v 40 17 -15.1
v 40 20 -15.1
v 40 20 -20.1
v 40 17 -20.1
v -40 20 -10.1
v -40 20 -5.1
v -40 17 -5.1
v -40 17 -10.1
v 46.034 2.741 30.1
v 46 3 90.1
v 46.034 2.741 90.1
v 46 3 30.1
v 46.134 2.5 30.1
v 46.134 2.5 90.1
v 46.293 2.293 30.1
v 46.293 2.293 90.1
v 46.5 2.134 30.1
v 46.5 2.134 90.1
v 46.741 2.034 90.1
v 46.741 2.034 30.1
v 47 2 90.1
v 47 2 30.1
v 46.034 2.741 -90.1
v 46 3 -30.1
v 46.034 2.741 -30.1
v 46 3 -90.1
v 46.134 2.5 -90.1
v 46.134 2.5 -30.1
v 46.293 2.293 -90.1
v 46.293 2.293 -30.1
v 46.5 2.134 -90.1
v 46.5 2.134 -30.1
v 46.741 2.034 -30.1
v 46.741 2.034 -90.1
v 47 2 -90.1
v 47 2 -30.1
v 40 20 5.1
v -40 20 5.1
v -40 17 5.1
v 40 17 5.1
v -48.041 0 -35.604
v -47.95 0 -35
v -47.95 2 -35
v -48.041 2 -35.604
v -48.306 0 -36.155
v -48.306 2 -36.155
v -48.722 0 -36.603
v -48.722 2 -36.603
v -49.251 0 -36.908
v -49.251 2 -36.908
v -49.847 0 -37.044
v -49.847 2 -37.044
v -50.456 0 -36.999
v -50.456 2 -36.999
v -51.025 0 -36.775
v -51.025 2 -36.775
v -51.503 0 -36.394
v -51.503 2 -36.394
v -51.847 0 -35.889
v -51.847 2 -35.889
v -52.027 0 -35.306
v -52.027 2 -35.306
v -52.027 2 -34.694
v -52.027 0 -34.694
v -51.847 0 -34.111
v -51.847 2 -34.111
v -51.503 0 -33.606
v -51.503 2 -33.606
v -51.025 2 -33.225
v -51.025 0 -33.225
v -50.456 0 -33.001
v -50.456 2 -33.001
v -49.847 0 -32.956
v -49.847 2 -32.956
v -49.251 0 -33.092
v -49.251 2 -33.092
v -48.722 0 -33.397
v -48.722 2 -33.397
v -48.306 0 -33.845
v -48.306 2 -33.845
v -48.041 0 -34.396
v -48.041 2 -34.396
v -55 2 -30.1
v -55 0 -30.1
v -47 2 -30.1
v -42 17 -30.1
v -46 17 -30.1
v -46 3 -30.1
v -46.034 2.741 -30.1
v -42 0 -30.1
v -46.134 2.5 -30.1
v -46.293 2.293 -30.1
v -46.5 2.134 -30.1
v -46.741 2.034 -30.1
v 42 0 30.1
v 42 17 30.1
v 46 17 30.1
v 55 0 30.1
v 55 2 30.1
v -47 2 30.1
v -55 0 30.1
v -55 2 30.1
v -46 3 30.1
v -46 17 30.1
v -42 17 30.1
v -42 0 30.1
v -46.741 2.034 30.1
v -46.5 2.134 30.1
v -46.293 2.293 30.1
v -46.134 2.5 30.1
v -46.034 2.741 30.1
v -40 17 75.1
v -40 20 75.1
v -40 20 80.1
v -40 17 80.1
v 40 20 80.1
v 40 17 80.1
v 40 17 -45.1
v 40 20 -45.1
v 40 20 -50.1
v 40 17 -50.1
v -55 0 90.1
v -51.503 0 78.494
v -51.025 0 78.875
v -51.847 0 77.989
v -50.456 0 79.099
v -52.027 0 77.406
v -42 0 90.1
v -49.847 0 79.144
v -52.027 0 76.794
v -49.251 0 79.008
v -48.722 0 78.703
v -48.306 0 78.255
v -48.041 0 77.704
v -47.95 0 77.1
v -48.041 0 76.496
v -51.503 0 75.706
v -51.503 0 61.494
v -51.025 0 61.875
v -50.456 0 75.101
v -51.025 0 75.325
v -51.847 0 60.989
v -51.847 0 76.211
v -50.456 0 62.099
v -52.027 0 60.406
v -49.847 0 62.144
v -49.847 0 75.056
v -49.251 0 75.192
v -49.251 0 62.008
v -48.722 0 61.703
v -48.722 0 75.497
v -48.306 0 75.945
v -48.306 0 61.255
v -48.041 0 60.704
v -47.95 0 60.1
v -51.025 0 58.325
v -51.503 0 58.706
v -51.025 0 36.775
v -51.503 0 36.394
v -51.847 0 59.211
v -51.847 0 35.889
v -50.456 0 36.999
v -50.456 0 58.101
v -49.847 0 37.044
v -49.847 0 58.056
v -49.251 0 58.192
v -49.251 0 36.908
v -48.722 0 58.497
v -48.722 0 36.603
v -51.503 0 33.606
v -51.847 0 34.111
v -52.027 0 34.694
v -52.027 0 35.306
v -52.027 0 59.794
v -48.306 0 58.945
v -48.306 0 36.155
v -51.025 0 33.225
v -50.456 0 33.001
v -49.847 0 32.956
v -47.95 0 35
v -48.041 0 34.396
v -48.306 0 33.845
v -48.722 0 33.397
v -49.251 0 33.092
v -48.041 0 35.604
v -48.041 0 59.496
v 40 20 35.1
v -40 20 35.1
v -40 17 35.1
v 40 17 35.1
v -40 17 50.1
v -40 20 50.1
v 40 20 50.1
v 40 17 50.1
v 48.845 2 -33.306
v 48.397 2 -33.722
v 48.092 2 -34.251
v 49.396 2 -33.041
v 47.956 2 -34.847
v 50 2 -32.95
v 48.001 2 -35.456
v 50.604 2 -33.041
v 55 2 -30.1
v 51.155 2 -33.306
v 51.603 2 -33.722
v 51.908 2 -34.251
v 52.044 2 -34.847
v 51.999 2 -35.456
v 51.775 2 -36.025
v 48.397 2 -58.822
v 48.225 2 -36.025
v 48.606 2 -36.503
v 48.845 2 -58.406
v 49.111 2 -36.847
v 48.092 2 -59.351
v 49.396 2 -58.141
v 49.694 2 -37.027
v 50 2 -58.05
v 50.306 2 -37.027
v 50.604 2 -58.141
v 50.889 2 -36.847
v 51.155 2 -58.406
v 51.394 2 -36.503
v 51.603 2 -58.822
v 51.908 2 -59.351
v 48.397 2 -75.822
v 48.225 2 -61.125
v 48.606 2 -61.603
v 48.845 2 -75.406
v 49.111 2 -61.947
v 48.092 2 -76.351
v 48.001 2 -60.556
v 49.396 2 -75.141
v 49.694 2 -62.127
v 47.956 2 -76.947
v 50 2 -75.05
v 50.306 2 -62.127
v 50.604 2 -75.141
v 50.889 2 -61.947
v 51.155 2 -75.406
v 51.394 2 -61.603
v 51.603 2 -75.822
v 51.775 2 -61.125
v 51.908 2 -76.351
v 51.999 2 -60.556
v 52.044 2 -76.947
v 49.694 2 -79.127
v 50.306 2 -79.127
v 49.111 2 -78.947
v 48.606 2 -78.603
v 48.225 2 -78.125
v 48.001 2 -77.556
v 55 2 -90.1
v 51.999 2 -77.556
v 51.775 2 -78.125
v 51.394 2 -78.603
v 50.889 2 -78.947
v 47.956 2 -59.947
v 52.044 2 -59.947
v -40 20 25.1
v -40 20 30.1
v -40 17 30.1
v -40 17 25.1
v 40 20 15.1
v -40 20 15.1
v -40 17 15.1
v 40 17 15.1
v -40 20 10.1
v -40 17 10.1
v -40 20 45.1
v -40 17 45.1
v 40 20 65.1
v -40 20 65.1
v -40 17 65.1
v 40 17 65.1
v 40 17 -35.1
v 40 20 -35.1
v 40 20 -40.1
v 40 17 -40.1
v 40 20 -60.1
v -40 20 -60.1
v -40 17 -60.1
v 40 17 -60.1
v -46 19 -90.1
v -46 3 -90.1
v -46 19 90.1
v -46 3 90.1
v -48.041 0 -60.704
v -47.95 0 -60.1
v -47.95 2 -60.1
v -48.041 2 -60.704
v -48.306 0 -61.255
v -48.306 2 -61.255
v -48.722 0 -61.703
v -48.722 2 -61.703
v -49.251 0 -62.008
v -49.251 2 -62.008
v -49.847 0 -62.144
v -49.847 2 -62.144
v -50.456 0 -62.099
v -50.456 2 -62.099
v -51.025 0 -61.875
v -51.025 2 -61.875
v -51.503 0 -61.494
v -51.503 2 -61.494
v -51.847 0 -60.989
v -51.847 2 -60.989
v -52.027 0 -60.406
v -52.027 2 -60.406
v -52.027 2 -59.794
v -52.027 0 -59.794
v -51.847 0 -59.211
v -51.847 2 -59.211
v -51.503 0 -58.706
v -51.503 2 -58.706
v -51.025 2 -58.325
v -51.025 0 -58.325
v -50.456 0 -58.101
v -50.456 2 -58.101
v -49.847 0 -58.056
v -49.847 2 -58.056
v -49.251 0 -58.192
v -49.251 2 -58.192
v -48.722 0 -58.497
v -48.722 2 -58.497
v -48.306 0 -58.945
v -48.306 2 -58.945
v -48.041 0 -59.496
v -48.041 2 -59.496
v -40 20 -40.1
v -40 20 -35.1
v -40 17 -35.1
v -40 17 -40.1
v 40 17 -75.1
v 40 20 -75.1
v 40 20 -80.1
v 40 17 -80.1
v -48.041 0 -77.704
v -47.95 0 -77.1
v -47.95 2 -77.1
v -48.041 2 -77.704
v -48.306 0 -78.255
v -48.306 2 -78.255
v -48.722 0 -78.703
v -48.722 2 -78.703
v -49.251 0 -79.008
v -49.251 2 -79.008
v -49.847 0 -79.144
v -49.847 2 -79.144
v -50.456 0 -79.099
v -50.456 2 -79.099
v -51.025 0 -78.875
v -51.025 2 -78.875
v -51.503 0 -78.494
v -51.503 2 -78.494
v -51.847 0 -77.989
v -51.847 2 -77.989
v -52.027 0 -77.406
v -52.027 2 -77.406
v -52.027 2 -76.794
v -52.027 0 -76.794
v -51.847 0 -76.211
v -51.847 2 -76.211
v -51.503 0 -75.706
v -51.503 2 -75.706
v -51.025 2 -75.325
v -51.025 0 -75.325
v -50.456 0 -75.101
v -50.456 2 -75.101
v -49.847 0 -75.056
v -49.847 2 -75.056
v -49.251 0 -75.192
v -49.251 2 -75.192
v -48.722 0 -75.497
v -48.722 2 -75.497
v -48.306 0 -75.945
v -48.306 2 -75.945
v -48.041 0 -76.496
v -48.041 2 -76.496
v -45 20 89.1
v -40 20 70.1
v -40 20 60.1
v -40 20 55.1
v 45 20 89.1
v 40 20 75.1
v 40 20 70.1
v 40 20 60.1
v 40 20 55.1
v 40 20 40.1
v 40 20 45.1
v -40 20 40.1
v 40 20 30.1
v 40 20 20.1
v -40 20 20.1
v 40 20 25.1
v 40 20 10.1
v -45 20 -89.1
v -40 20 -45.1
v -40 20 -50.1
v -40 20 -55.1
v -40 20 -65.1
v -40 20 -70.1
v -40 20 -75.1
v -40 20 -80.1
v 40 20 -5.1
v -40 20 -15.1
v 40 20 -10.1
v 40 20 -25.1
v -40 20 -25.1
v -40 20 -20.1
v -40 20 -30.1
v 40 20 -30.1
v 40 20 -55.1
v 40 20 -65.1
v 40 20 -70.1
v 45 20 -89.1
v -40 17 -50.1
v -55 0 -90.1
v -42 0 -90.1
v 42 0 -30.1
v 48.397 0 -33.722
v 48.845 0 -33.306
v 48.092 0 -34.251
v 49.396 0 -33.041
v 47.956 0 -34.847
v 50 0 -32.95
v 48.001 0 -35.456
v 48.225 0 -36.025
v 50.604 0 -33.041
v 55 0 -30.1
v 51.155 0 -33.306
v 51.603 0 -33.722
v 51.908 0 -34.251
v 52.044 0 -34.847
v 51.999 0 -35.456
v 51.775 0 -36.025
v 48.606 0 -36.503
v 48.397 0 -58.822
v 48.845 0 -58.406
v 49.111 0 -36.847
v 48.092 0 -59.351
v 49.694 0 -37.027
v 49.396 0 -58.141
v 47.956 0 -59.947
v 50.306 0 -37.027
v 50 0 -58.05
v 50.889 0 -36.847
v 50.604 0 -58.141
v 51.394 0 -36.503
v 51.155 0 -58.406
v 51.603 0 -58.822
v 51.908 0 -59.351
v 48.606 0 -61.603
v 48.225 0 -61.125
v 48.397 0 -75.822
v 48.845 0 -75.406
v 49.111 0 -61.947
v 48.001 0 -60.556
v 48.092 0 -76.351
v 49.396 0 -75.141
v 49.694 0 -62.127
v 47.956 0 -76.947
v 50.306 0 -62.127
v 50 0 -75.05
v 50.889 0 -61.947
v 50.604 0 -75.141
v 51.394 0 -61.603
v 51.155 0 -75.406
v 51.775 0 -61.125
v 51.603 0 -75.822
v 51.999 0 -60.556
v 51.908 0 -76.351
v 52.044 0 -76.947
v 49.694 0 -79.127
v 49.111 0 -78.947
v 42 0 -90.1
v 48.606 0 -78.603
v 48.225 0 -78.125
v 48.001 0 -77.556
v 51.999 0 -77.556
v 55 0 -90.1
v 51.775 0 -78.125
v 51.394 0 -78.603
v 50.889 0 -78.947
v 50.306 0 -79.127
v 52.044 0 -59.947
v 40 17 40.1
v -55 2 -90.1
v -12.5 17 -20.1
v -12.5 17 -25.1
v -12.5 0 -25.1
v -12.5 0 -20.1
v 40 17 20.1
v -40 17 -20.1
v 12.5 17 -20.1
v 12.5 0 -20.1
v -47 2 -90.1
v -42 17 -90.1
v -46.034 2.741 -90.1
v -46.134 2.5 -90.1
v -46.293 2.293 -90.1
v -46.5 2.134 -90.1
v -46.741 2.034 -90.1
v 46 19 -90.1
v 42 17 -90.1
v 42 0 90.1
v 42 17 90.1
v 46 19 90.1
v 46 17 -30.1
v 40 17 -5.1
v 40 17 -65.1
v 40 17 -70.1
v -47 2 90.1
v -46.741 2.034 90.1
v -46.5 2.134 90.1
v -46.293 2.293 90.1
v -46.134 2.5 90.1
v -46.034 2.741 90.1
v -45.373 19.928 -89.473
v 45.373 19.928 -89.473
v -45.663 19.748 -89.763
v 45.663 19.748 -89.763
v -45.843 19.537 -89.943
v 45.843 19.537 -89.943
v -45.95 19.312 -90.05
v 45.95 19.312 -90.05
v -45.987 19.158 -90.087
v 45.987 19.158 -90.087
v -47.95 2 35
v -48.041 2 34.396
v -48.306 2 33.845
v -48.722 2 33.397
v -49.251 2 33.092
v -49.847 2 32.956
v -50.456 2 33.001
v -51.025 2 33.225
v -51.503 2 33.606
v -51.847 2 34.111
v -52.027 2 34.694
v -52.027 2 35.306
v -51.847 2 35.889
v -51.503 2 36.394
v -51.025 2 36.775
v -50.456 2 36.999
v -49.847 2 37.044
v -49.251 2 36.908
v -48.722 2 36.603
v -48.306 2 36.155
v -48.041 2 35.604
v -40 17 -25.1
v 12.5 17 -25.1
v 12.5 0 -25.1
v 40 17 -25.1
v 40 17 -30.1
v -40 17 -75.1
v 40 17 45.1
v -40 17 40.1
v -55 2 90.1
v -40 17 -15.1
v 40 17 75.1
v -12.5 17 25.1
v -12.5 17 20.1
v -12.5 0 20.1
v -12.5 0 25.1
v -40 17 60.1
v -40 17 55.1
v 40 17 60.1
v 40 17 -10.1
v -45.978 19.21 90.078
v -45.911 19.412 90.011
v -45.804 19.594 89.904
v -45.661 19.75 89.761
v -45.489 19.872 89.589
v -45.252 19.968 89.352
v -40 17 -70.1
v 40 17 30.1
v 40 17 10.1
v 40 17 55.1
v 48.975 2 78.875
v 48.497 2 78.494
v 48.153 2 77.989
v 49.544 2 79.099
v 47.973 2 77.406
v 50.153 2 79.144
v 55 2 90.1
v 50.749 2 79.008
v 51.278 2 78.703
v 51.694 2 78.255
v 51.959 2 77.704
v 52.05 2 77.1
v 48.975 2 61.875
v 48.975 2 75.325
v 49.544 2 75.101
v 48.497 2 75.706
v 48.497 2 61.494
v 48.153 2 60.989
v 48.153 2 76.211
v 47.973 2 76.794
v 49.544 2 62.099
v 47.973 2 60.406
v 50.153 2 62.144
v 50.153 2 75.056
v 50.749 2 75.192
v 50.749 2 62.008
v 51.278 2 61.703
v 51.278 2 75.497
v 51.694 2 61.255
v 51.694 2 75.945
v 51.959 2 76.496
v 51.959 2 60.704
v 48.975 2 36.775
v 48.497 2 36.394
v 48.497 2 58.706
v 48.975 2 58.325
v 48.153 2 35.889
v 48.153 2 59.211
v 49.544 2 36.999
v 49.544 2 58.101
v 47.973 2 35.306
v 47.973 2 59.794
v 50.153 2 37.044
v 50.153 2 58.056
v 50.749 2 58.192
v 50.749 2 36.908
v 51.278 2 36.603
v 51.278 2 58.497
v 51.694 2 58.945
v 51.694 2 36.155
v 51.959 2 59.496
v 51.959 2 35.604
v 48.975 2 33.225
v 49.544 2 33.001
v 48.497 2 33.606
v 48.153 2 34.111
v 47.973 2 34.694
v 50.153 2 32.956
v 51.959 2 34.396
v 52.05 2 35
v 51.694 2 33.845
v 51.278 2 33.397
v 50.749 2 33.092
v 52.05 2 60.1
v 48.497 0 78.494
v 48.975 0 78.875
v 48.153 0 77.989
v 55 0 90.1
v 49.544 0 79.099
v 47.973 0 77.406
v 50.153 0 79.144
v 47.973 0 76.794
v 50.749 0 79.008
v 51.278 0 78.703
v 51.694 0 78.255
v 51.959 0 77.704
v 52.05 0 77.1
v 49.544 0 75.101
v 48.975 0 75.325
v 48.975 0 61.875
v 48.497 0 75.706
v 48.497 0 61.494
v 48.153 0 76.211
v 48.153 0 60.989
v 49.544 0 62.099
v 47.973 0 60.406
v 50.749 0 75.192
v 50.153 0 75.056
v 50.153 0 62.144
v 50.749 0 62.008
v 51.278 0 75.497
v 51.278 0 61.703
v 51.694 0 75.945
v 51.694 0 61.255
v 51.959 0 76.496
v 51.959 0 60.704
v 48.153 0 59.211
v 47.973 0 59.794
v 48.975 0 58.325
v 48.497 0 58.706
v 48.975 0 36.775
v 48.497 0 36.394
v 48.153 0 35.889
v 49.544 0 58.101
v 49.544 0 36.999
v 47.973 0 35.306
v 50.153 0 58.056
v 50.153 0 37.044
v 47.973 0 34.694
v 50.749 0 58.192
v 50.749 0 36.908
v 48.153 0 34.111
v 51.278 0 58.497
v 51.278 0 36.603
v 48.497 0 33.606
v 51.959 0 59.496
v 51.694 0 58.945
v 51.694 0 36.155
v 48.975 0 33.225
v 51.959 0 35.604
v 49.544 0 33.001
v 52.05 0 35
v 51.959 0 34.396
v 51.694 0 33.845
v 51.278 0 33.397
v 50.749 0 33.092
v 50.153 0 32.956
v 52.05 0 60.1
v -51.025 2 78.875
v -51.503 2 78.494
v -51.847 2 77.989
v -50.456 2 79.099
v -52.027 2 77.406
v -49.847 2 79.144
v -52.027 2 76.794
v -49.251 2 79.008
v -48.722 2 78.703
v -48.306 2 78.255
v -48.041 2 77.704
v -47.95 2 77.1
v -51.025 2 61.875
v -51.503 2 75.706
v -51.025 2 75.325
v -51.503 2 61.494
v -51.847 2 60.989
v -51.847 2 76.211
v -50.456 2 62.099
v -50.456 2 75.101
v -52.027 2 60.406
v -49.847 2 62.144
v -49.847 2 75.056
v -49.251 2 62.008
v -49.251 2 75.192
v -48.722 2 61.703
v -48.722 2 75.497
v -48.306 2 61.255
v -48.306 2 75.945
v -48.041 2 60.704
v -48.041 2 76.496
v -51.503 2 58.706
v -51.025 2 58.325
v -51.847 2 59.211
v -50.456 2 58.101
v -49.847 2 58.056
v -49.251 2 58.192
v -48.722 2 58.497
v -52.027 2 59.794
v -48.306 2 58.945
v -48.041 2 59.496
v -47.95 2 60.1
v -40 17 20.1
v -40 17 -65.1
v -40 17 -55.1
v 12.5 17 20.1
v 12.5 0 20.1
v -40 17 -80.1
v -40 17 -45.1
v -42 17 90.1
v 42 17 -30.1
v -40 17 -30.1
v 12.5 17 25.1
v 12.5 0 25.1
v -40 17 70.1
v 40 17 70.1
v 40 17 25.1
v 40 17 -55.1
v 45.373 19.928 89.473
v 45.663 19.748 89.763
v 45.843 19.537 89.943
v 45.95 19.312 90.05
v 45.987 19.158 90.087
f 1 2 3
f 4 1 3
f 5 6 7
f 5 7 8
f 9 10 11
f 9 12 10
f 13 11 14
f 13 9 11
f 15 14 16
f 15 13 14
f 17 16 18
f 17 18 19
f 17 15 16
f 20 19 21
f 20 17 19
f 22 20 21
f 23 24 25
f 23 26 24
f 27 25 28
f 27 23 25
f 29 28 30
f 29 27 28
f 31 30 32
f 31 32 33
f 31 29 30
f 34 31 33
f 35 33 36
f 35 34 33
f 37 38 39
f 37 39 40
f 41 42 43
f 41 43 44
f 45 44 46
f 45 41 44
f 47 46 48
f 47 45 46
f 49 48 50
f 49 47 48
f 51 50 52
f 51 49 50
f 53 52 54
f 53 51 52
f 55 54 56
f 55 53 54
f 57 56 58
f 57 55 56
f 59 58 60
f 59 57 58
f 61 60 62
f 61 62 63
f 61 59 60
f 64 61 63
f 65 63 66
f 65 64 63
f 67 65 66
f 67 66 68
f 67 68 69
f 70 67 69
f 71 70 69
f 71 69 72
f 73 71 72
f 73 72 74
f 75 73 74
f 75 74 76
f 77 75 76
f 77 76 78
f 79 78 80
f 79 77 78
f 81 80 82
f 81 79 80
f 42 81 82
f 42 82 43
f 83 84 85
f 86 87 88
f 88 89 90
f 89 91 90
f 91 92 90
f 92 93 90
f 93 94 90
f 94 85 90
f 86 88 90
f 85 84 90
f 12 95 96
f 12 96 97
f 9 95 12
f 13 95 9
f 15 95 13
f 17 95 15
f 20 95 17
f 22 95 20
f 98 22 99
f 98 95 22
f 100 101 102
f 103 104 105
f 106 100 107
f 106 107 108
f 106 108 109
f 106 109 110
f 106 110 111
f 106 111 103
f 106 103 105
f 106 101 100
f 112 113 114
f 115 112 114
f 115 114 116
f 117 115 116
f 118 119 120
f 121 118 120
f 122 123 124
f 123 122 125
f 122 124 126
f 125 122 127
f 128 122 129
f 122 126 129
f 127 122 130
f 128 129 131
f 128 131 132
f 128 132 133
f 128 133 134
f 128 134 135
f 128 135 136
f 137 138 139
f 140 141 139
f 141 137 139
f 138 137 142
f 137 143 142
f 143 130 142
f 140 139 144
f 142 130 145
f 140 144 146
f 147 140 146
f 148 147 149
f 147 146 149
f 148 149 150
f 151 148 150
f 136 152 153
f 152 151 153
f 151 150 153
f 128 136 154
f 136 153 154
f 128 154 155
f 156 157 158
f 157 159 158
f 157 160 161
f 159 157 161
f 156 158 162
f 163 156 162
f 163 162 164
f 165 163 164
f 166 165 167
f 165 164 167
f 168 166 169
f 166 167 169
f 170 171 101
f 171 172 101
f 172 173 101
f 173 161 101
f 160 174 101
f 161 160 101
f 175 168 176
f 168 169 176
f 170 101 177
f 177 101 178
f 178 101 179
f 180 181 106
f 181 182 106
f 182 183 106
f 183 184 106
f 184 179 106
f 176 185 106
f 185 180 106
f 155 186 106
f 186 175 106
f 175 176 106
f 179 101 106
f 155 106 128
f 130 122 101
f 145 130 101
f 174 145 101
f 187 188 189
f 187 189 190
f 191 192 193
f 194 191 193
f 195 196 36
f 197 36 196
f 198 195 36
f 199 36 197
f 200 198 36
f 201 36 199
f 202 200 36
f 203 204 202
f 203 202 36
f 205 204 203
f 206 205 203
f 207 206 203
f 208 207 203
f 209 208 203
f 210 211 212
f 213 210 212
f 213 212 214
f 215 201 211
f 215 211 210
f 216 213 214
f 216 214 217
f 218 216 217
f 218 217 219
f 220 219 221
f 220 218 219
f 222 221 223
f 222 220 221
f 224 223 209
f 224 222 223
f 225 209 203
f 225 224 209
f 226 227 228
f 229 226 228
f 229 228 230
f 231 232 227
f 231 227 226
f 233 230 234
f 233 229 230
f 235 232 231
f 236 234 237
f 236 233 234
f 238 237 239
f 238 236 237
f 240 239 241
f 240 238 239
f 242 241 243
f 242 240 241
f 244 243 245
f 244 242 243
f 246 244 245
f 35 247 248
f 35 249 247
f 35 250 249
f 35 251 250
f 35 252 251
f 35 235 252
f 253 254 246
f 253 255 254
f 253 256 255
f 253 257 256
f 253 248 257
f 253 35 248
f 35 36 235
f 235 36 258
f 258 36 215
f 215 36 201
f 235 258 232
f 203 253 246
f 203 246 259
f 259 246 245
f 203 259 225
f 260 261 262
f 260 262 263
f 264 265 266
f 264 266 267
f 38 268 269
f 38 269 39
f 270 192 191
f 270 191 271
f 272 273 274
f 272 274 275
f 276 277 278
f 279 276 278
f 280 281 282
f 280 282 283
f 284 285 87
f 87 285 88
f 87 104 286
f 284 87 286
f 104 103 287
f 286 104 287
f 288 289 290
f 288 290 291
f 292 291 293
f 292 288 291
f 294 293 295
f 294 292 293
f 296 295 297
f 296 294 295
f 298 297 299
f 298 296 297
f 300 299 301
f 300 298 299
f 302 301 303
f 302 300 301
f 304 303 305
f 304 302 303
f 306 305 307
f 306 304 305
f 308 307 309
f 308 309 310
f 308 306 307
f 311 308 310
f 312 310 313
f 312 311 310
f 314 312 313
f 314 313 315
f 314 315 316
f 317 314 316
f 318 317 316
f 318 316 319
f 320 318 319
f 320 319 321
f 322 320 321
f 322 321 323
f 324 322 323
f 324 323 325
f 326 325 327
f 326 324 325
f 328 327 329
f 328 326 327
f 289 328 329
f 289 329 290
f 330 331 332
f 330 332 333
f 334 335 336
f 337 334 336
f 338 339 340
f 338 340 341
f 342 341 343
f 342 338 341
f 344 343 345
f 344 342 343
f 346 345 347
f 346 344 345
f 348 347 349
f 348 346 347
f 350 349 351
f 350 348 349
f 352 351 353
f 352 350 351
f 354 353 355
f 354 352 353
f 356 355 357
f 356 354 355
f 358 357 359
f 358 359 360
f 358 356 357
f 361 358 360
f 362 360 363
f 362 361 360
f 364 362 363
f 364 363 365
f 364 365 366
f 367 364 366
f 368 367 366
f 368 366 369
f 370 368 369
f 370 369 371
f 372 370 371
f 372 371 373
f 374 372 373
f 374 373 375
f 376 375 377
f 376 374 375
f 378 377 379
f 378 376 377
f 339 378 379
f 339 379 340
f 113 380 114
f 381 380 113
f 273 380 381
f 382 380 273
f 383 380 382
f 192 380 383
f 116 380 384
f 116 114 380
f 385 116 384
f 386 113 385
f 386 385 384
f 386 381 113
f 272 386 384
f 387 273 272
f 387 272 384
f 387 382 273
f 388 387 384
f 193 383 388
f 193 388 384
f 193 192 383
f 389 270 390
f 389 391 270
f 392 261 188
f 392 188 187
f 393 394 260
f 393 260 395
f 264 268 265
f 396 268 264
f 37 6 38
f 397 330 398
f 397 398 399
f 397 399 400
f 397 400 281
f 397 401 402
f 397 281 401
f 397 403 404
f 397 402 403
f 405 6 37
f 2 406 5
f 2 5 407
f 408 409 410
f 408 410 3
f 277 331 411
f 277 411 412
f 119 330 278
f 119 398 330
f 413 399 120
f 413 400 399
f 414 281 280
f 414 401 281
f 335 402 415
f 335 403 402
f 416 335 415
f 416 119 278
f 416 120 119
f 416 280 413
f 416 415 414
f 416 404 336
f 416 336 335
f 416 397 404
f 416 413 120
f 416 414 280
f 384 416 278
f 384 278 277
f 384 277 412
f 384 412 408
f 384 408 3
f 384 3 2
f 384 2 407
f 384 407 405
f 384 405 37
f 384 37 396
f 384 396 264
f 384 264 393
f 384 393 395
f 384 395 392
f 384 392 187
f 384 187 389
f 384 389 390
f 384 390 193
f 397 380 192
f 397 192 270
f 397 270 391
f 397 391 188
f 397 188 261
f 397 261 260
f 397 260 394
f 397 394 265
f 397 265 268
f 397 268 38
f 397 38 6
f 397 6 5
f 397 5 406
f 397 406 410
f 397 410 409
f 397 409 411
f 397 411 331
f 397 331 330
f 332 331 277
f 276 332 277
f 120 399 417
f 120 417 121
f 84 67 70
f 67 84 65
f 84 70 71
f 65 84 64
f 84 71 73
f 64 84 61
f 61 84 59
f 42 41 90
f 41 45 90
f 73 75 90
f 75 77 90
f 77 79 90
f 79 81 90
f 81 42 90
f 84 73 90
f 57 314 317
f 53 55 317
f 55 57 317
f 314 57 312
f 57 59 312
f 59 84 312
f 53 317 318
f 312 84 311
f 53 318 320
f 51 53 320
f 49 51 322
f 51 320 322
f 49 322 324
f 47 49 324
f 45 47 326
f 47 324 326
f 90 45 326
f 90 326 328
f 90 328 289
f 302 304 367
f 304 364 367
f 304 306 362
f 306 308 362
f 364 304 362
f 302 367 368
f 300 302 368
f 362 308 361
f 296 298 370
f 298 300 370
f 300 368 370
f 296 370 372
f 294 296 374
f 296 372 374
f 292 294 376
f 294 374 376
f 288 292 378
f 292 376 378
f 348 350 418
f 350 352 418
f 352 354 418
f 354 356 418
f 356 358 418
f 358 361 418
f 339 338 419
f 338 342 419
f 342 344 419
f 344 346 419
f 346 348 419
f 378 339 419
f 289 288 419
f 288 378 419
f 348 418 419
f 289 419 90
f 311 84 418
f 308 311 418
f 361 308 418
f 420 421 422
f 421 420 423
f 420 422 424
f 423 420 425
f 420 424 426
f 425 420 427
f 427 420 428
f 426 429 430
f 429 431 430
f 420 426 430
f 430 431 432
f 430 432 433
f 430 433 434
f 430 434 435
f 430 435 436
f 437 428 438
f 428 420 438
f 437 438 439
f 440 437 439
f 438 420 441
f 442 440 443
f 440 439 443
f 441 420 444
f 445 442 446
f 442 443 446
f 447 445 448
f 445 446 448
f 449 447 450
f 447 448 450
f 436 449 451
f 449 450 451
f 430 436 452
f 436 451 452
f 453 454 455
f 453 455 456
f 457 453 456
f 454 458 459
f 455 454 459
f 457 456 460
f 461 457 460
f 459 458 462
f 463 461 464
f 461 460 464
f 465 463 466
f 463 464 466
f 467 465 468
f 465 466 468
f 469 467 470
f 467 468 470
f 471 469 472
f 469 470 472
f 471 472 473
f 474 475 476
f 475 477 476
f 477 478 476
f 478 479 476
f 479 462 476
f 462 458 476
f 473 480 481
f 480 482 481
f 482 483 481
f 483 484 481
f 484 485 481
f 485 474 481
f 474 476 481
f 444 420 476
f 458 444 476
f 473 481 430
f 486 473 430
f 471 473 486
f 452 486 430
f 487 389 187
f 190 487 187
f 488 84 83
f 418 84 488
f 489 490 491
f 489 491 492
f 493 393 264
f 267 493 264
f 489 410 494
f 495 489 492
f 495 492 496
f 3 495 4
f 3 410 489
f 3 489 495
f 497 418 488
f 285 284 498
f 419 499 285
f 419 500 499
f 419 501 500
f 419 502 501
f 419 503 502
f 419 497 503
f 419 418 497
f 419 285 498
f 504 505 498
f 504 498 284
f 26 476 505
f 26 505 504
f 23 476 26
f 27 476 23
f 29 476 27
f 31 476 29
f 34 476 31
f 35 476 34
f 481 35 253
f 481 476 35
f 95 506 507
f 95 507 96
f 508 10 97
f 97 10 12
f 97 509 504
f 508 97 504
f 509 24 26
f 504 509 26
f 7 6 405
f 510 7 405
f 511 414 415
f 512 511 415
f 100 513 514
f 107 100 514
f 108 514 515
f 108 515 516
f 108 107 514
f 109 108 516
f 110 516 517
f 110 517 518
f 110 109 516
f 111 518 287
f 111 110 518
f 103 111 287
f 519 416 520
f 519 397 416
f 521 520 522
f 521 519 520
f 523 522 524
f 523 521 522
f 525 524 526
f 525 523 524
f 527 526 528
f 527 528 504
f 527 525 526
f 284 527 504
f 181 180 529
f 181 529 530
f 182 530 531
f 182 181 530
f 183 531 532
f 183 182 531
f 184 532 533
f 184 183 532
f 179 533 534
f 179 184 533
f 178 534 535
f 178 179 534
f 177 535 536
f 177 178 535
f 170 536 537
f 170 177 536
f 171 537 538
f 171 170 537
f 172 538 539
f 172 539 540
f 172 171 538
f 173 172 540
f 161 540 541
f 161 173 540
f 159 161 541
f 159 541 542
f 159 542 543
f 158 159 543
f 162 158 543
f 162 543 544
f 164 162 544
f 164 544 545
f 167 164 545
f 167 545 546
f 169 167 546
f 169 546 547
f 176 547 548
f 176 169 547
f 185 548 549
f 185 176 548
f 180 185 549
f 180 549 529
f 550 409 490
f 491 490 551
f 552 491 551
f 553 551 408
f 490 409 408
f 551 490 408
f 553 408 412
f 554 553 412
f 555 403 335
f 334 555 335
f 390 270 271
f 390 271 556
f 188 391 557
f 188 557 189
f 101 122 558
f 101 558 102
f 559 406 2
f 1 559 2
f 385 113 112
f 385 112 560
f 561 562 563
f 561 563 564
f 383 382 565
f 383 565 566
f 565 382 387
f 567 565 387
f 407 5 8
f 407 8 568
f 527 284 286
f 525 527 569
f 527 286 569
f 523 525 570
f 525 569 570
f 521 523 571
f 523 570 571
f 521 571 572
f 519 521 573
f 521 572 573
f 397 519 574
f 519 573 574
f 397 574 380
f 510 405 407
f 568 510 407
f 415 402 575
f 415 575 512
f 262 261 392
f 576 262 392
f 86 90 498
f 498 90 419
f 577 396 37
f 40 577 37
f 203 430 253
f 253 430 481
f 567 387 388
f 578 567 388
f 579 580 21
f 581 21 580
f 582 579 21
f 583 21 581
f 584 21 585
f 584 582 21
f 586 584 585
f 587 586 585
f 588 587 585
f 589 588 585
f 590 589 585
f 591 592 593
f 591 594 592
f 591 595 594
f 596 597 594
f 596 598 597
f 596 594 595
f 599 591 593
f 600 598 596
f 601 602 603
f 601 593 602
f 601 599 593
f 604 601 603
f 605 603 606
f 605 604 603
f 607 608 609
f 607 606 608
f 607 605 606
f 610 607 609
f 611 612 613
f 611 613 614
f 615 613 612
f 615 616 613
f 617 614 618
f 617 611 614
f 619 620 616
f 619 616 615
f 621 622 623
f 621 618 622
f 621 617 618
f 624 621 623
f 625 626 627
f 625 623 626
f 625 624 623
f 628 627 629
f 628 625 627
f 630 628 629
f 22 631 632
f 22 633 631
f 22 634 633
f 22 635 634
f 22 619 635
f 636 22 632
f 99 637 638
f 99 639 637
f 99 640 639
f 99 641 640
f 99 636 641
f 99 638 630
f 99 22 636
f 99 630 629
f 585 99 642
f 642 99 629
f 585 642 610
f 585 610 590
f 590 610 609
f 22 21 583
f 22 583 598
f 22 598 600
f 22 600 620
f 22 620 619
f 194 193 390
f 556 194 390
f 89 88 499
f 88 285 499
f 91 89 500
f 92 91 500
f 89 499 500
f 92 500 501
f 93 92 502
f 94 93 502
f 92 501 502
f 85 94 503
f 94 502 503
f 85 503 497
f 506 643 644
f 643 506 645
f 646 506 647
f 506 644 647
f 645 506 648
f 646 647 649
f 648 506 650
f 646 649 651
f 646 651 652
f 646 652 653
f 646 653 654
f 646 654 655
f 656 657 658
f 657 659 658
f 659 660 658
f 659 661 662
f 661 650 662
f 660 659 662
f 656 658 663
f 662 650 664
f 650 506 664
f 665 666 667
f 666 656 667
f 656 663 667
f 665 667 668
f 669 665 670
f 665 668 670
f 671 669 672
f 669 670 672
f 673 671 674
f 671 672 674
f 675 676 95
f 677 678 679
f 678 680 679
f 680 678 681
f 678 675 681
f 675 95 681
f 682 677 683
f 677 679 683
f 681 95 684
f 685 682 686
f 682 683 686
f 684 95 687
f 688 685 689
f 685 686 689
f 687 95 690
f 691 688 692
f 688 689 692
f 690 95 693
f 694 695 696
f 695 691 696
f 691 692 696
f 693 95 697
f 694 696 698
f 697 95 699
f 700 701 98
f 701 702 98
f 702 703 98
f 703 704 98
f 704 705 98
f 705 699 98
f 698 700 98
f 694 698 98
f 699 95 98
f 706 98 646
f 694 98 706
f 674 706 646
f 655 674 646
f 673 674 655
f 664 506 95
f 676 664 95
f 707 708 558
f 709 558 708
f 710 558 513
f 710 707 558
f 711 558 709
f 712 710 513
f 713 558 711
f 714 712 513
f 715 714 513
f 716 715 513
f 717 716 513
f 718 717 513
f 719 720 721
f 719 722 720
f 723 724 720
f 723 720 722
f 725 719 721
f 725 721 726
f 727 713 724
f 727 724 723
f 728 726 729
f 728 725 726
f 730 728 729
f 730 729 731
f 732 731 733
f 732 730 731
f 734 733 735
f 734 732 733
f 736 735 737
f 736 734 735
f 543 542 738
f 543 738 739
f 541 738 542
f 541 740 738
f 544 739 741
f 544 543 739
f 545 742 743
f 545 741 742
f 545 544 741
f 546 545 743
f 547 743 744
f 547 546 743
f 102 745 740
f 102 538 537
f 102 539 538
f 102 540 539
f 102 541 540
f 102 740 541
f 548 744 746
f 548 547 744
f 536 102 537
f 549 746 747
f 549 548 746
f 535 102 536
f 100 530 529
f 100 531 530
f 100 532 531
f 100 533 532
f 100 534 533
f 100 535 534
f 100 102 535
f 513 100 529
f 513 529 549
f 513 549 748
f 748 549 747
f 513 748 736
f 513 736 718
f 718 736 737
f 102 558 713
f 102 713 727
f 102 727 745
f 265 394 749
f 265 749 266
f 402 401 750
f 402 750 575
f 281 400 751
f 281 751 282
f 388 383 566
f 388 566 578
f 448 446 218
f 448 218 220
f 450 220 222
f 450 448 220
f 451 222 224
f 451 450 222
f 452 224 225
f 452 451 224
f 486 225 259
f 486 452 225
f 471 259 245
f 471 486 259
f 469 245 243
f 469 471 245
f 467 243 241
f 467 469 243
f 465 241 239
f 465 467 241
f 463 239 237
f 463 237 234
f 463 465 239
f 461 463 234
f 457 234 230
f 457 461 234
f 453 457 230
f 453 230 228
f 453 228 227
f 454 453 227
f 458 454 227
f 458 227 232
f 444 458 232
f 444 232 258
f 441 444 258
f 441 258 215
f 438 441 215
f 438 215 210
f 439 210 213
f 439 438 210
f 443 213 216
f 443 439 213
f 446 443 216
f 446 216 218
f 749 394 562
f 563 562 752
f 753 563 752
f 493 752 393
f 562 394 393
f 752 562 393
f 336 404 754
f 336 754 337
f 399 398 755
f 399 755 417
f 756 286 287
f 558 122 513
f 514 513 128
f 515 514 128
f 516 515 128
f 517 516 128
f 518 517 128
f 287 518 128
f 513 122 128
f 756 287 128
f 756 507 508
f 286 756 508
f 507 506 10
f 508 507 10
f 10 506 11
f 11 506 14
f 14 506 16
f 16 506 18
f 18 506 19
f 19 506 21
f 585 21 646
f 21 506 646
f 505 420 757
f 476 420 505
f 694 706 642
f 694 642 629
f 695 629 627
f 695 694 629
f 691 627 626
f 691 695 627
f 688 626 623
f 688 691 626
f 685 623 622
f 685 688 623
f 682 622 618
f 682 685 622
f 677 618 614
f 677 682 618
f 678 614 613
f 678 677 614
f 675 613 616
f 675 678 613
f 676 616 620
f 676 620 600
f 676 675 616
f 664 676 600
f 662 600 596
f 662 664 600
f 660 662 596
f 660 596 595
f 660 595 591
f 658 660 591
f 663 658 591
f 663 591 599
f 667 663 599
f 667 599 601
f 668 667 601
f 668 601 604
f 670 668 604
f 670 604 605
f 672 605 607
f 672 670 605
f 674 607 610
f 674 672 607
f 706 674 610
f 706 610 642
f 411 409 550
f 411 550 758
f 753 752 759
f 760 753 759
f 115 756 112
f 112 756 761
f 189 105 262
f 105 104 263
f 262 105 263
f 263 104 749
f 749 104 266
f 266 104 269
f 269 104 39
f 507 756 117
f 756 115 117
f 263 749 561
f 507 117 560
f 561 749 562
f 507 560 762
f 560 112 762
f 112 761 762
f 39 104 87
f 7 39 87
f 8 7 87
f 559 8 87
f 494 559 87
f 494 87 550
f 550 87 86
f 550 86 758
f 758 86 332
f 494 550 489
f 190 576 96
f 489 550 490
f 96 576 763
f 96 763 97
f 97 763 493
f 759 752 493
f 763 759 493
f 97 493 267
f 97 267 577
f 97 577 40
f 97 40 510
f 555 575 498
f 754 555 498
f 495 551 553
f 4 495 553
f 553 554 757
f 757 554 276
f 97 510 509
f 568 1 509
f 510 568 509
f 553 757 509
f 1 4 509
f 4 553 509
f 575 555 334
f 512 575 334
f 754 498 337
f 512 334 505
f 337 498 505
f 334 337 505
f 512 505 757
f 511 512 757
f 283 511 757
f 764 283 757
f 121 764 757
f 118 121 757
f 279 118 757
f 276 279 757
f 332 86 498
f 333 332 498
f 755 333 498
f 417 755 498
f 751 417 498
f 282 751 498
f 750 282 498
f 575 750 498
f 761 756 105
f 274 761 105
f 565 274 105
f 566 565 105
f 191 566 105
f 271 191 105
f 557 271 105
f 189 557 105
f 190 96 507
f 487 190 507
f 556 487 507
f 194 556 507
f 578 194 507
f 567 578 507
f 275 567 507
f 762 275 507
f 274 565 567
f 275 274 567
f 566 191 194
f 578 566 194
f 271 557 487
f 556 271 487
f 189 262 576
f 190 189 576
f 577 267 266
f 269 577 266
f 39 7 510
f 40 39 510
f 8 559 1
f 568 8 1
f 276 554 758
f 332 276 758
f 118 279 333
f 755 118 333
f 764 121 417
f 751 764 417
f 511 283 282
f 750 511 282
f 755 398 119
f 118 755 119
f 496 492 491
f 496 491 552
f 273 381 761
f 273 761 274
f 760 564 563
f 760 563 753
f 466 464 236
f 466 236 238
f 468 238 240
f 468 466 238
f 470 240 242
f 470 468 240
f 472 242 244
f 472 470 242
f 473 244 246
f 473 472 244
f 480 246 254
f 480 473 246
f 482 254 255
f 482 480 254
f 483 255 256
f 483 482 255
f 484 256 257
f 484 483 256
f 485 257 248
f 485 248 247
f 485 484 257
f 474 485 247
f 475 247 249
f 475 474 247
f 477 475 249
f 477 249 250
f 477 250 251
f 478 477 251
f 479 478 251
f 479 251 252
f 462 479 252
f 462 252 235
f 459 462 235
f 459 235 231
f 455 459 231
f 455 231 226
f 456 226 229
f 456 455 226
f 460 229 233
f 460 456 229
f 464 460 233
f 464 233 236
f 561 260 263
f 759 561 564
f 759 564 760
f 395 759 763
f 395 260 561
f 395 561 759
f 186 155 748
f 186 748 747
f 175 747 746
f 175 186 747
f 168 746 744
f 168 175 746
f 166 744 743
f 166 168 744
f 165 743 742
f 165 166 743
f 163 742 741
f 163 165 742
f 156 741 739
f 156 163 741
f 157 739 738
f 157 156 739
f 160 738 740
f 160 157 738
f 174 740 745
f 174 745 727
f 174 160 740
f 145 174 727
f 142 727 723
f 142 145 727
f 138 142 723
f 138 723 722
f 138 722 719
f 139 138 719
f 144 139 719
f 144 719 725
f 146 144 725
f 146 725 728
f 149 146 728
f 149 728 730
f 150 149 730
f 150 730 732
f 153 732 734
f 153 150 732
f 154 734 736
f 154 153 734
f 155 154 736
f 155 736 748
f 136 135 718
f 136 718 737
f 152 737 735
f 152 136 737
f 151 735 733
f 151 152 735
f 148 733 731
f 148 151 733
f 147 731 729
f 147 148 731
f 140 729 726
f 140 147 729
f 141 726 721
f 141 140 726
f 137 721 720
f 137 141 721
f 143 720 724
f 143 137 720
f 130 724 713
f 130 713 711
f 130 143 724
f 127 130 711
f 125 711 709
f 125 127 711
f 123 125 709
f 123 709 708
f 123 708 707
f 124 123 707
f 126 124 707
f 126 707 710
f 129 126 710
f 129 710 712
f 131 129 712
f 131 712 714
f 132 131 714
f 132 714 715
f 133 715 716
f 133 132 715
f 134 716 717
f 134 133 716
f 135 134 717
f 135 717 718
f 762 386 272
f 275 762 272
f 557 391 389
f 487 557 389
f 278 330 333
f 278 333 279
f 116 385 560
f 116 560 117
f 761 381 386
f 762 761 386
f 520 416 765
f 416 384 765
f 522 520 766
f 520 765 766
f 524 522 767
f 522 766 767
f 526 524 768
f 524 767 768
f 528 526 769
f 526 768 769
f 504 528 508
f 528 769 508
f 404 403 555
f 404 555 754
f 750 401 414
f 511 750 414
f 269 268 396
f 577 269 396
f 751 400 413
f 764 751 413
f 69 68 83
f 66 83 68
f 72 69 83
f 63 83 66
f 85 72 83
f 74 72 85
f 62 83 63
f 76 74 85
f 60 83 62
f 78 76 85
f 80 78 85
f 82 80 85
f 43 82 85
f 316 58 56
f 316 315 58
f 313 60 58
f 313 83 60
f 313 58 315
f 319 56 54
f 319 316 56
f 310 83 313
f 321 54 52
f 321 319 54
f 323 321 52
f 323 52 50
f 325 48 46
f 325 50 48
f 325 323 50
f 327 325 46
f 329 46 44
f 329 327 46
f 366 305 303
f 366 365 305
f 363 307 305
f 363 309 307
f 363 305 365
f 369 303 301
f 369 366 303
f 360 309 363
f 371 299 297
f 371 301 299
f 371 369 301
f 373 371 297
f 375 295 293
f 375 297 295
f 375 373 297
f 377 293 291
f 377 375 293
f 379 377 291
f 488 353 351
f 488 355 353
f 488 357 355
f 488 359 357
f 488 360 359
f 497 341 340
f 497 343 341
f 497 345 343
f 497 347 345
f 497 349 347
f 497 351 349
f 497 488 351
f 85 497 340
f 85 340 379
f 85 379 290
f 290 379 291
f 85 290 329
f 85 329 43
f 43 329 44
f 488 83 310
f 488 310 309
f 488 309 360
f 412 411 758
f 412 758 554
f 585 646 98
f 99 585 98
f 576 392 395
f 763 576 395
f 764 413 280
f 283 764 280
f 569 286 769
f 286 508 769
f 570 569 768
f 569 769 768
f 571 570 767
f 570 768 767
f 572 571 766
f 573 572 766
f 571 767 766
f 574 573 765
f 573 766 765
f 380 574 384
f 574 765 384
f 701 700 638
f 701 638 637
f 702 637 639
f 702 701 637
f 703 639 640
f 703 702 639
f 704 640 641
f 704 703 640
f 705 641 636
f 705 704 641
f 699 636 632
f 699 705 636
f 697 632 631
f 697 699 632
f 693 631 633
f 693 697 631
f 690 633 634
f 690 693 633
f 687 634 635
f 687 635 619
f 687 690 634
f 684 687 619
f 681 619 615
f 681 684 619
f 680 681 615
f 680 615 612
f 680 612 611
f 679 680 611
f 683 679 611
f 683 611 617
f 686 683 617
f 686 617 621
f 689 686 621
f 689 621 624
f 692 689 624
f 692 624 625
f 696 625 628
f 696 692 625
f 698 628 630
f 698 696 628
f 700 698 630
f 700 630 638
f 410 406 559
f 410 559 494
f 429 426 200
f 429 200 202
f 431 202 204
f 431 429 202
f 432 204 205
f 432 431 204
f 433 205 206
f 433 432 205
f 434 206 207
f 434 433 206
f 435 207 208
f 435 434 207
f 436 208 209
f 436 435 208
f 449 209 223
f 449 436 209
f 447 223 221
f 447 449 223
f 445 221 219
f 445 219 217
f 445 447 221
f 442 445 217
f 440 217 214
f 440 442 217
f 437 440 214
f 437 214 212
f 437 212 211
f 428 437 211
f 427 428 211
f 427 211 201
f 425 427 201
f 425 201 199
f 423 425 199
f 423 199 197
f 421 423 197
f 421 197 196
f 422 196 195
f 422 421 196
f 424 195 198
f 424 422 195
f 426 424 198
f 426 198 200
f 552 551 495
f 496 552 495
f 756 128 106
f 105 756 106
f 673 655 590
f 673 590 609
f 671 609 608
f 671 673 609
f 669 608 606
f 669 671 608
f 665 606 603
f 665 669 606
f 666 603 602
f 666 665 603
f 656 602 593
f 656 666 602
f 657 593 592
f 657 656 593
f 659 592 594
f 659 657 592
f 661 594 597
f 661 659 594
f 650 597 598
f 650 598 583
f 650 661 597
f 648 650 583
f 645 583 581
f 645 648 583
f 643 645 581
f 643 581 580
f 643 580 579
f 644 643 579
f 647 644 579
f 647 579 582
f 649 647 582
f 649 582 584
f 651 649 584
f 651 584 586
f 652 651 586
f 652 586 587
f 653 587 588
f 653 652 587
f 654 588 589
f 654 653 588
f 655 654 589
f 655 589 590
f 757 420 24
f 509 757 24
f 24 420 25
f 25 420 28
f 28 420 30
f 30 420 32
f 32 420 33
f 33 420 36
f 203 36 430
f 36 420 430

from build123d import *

# Parameters (mm, degrees)
SKETCH1_W               = 13
SKETCH1_H               = 60
SKETCH1_R               = 2.05
BOSS_EXTRUDE1_DEPTH     = 2
SKETCH2_W               = 4
SKETCH2_H               = 60
BOSS_EXTRUDE2_DEPTH     = 15
SKETCH3_W               = 46
SKETCH3_H               = 90.1
BOSS_EXTRUDE3_DEPTH     = 3
MIRROR1_START           = 17
MIRROR1_DEPTH           = 3
MIRROR1_2_OUTLINE_W     = 4
MIRROR1_2_OUTLINE_H     = 60
MIRROR1_2_DEPTH         = 17
MIRROR1_3_OUTLINE_W     = 9
MIRROR1_3_OUTLINE_H     = 60
MIRROR1_3_OUTLINE_R     = 2.05
MIRROR1_3_DEPTH         = 2
SKETCH4_W               = 80
SKETCH4_H               = 5
CUT_EXTRUDE1_DEPTH      = 3
LPATTERN1_COUNT         = 8
LPATTERN1_PITCH         = 10
MIRROR2_COPY_1_SKETCH_W = 80
MIRROR2_COPY_1_SKETCH_H = 5
MIRROR2_COPY_1_DEPTH    = 3
MIRROR2_COPY_2_SKETCH_W = 80
MIRROR2_COPY_2_SKETCH_H = 5
MIRROR2_COPY_2_DEPTH    = 3
MIRROR2_COPY_3_SKETCH_W = 80
MIRROR2_COPY_3_SKETCH_H = 5
MIRROR2_COPY_3_DEPTH    = 3
MIRROR2_COPY_4_SKETCH_W = 80
MIRROR2_COPY_4_SKETCH_H = 5
MIRROR2_COPY_4_DEPTH    = 3
MIRROR2_COPY_5_SKETCH_W = 80
MIRROR2_COPY_5_SKETCH_H = 5
MIRROR2_COPY_5_DEPTH    = 3
MIRROR2_COPY_6_SKETCH_W = 80
MIRROR2_COPY_6_SKETCH_H = 5
MIRROR2_COPY_6_DEPTH    = 3
MIRROR2_COPY_7_SKETCH_W = 80
MIRROR2_COPY_7_SKETCH_H = 5
MIRROR2_COPY_7_DEPTH    = 3
FILLET1_R               = 1
SKETCH5_W               = 25
SKETCH5_H               = 5
BOSS_EXTRUDE4_DEPTH     = 17


# Read off the part's stored shape, not the designer's step: Mirror1
with BuildPart() as part:
    # Sketch1 → Boss-Extrude1 (new body)
    with BuildSketch(Plane(origin=(0, 0, 0), x_dir=(1, 0, 0), z_dir=(0, 1, 0))):
        with Locations((48.5, 60.1)):
            Rectangle(SKETCH1_W, SKETCH1_H)
        with Locations(Location((50, 77.1, 0), (0, 0, 270))):
            Circle(SKETCH1_R, mode=Mode.SUBTRACT)
        with Locations(Location((50, 60.1, 0), (0, 0, 270))):
            Circle(SKETCH1_R, mode=Mode.SUBTRACT)
        with Locations(Location((50, 35, 0), (0, 0, 270))):
            Circle(SKETCH1_R, mode=Mode.SUBTRACT)
    extrude(amount=BOSS_EXTRUDE1_DEPTH)

    # Sketch2 → Boss-Extrude2 (add)
    with BuildSketch(Plane(origin=(0, 2, 0), x_dir=(1, 0, 0), z_dir=(0, 1, 0))):
        with Locations((44, 60.1)):
            Rectangle(SKETCH2_W, SKETCH2_H)
    extrude(amount=BOSS_EXTRUDE2_DEPTH)

    # Sketch3 → Boss-Extrude3 (add)
    with BuildSketch(Plane(origin=(0, 17, 0), x_dir=(1, 0, 0), z_dir=(0, 1, 0))):
        with Locations((23, 45.05)):
            Rectangle(SKETCH3_W, SKETCH3_H)
    extrude(amount=BOSS_EXTRUDE3_DEPTH)

    # Mirror1 outline → Mirror1 (add)
    with BuildSketch(Plane(origin=(0, 0, 0), x_dir=(1, 0, 0), z_dir=(0, 1, 0)).offset(MIRROR1_START)):
        Polygon((46, -90.1), (46, 0), (0, 0), (0, 90.1), (-46, 90.1), (-46, -90.1), align=None)
    extrude(amount=MIRROR1_DEPTH)

    # Mirror1 2 outline → Mirror1 2 (add)
    with BuildSketch(Plane(origin=(0, 0, 0), x_dir=(1, 0, 0), z_dir=(0, 1, 0))):
        with Locations((44, -60.1)):
            Rectangle(MIRROR1_2_OUTLINE_W, MIRROR1_2_OUTLINE_H)
        with Locations((-44, -60.1)):
            Rectangle(MIRROR1_2_OUTLINE_W, MIRROR1_2_OUTLINE_H)
        with Locations((-44, 60.1)):
            Rectangle(MIRROR1_2_OUTLINE_W, MIRROR1_2_OUTLINE_H)
    extrude(amount=MIRROR1_2_DEPTH)

    # Mirror1 3 outline → Mirror1 3 (add)
    # profile 1 of 3: a face of its own
    with BuildSketch(Plane(origin=(0, 0, 0), x_dir=(1, 0, 0), z_dir=(0, 1, 0))):
        with Locations((50.5, -60.1)):
            Rectangle(MIRROR1_3_OUTLINE_W, MIRROR1_3_OUTLINE_H)
        with Locations((50, -77.1)):
            Circle(MIRROR1_3_OUTLINE_R, mode=Mode.SUBTRACT)
        with Locations((50, -60.1)):
            Circle(MIRROR1_3_OUTLINE_R, mode=Mode.SUBTRACT)
        with Locations((50, -35)):
            Circle(MIRROR1_3_OUTLINE_R, mode=Mode.SUBTRACT)
    # profile 2 of 3: a face of its own
    with BuildSketch(Plane(origin=(0, 0, 0), x_dir=(1, 0, 0), z_dir=(0, 1, 0))):
        with Locations((-50.5, -60.1)):
            Rectangle(MIRROR1_3_OUTLINE_W, MIRROR1_3_OUTLINE_H)
        with Locations((-50, -77.1)):
            Circle(MIRROR1_3_OUTLINE_R, mode=Mode.SUBTRACT)
        with Locations((-50, -60.1)):
            Circle(MIRROR1_3_OUTLINE_R, mode=Mode.SUBTRACT)
        with Locations((-50, -35)):
            Circle(MIRROR1_3_OUTLINE_R, mode=Mode.SUBTRACT)
    # profile 3 of 3: a face of its own
    with BuildSketch(Plane(origin=(0, 0, 0), x_dir=(1, 0, 0), z_dir=(0, 1, 0))):
        with Locations((-50.5, 60.1)):
            Rectangle(MIRROR1_3_OUTLINE_W, MIRROR1_3_OUTLINE_H)
        with Locations((-50, 35)):
            Circle(MIRROR1_3_OUTLINE_R, mode=Mode.SUBTRACT)
        with Locations((-50, 60.1)):
            Circle(MIRROR1_3_OUTLINE_R, mode=Mode.SUBTRACT)
        with Locations((-50, 77.1)):
            Circle(MIRROR1_3_OUTLINE_R, mode=Mode.SUBTRACT)
    extrude(amount=MIRROR1_3_DEPTH)

    # Sketch4 → Cut-Extrude1 (cut)
    with BuildSketch(Plane(origin=(0, 20, 0), x_dir=(1, 0, 0), z_dir=(0, 1, 0))):
        with Locations((0, 77.6)):
            Rectangle(SKETCH4_W, SKETCH4_H)
    cut_extrude1 = extrude(amount=-CUT_EXTRUDE1_DEPTH, mode=Mode.SUBTRACT)

    # LPattern1: Cut-Extrude1 ×8
    with Locations(*[(0, 0, i * LPATTERN1_PITCH) for i in range(1, LPATTERN1_COUNT)]):
        add(cut_extrude1, mode=Mode.SUBTRACT)

    # Mirror2: Cut-Extrude1 across Front Plane
    add(cut_extrude1.mirror(Plane.XY), mode=Mode.SUBTRACT)

    # Mirror2 copy 1 sketch → Mirror2 copy 1 (cut)
    with BuildSketch(Plane(origin=(0, 20, -10), x_dir=(1, 0, 0), z_dir=(0, 1, 0))):
        with Locations((0, -77.6)):
            Rectangle(MIRROR2_COPY_1_SKETCH_W, MIRROR2_COPY_1_SKETCH_H)
    extrude(amount=-MIRROR2_COPY_1_DEPTH, mode=Mode.SUBTRACT)

    # Mirror2 copy 2 sketch → Mirror2 copy 2 (cut)
    with BuildSketch(Plane(origin=(0, 20, -20), x_dir=(1, 0, 0), z_dir=(0, 1, 0))):
        with Locations((0, -77.6)):
            Rectangle(MIRROR2_COPY_2_SKETCH_W, MIRROR2_COPY_2_SKETCH_H)
    extrude(amount=-MIRROR2_COPY_2_DEPTH, mode=Mode.SUBTRACT)

    # Mirror2 copy 3 sketch → Mirror2 copy 3 (cut)
    with BuildSketch(Plane(origin=(0, 20, -30), x_dir=(1, 0, 0), z_dir=(0, 1, 0))):
        with Locations((0, -77.6)):
            Rectangle(MIRROR2_COPY_3_SKETCH_W, MIRROR2_COPY_3_SKETCH_H)
    extrude(amount=-MIRROR2_COPY_3_DEPTH, mode=Mode.SUBTRACT)

    # Mirror2 copy 4 sketch → Mirror2 copy 4 (cut)
    with BuildSketch(Plane(origin=(0, 20, -40), x_dir=(1, 0, 0), z_dir=(0, 1, 0))):
        with Locations((0, -77.6)):
            Rectangle(MIRROR2_COPY_4_SKETCH_W, MIRROR2_COPY_4_SKETCH_H)
    extrude(amount=-MIRROR2_COPY_4_DEPTH, mode=Mode.SUBTRACT)

    # Mirror2 copy 5 sketch → Mirror2 copy 5 (cut)
    with BuildSketch(Plane(origin=(0, 20, -50), x_dir=(1, 0, 0), z_dir=(0, 1, 0))):
        with Locations((0, -77.6)):
            Rectangle(MIRROR2_COPY_5_SKETCH_W, MIRROR2_COPY_5_SKETCH_H)
    extrude(amount=-MIRROR2_COPY_5_DEPTH, mode=Mode.SUBTRACT)

    # Mirror2 copy 6 sketch → Mirror2 copy 6 (cut)
    with BuildSketch(Plane(origin=(0, 20, -60), x_dir=(1, 0, 0), z_dir=(0, 1, 0))):
        with Locations((0, -77.6)):
            Rectangle(MIRROR2_COPY_6_SKETCH_W, MIRROR2_COPY_6_SKETCH_H)
    extrude(amount=-MIRROR2_COPY_6_DEPTH, mode=Mode.SUBTRACT)

    # Mirror2 copy 7 sketch → Mirror2 copy 7 (cut)
    with BuildSketch(Plane(origin=(0, 20, -70), x_dir=(1, 0, 0), z_dir=(0, 1, 0))):
        with Locations((0, -77.6)):
            Rectangle(MIRROR2_COPY_7_SKETCH_W, MIRROR2_COPY_7_SKETCH_H)
    extrude(amount=-MIRROR2_COPY_7_DEPTH, mode=Mode.SUBTRACT)

    # Fillet1
    fillet1_edges = [part.edges().sort_by_distance(p)[0] for p in [
        (46, 2, -60.1),
        (46, 20, 0),
        (0, 20, -90.1),
        (-46, 2, -60.1),
        (-46, 2, 60.1),
        (-46, 20, 0),
        (46, 2, 60.1),
        (0, 20, 90.1),
    ]]
    fillet(fillet1_edges, radius=FILLET1_R)

    # Sketch5 → Boss-Extrude4 (add)
    with BuildSketch(Plane.XZ.offset(-17)):
        with Locations((0, 22.6)):
            Rectangle(SKETCH5_W, SKETCH5_H)
        with Locations((0, -22.6)):
            Rectangle(SKETCH5_W, SKETCH5_H)
    extrude(amount=BOSS_EXTRUDE4_DEPTH)


solid = part.part
